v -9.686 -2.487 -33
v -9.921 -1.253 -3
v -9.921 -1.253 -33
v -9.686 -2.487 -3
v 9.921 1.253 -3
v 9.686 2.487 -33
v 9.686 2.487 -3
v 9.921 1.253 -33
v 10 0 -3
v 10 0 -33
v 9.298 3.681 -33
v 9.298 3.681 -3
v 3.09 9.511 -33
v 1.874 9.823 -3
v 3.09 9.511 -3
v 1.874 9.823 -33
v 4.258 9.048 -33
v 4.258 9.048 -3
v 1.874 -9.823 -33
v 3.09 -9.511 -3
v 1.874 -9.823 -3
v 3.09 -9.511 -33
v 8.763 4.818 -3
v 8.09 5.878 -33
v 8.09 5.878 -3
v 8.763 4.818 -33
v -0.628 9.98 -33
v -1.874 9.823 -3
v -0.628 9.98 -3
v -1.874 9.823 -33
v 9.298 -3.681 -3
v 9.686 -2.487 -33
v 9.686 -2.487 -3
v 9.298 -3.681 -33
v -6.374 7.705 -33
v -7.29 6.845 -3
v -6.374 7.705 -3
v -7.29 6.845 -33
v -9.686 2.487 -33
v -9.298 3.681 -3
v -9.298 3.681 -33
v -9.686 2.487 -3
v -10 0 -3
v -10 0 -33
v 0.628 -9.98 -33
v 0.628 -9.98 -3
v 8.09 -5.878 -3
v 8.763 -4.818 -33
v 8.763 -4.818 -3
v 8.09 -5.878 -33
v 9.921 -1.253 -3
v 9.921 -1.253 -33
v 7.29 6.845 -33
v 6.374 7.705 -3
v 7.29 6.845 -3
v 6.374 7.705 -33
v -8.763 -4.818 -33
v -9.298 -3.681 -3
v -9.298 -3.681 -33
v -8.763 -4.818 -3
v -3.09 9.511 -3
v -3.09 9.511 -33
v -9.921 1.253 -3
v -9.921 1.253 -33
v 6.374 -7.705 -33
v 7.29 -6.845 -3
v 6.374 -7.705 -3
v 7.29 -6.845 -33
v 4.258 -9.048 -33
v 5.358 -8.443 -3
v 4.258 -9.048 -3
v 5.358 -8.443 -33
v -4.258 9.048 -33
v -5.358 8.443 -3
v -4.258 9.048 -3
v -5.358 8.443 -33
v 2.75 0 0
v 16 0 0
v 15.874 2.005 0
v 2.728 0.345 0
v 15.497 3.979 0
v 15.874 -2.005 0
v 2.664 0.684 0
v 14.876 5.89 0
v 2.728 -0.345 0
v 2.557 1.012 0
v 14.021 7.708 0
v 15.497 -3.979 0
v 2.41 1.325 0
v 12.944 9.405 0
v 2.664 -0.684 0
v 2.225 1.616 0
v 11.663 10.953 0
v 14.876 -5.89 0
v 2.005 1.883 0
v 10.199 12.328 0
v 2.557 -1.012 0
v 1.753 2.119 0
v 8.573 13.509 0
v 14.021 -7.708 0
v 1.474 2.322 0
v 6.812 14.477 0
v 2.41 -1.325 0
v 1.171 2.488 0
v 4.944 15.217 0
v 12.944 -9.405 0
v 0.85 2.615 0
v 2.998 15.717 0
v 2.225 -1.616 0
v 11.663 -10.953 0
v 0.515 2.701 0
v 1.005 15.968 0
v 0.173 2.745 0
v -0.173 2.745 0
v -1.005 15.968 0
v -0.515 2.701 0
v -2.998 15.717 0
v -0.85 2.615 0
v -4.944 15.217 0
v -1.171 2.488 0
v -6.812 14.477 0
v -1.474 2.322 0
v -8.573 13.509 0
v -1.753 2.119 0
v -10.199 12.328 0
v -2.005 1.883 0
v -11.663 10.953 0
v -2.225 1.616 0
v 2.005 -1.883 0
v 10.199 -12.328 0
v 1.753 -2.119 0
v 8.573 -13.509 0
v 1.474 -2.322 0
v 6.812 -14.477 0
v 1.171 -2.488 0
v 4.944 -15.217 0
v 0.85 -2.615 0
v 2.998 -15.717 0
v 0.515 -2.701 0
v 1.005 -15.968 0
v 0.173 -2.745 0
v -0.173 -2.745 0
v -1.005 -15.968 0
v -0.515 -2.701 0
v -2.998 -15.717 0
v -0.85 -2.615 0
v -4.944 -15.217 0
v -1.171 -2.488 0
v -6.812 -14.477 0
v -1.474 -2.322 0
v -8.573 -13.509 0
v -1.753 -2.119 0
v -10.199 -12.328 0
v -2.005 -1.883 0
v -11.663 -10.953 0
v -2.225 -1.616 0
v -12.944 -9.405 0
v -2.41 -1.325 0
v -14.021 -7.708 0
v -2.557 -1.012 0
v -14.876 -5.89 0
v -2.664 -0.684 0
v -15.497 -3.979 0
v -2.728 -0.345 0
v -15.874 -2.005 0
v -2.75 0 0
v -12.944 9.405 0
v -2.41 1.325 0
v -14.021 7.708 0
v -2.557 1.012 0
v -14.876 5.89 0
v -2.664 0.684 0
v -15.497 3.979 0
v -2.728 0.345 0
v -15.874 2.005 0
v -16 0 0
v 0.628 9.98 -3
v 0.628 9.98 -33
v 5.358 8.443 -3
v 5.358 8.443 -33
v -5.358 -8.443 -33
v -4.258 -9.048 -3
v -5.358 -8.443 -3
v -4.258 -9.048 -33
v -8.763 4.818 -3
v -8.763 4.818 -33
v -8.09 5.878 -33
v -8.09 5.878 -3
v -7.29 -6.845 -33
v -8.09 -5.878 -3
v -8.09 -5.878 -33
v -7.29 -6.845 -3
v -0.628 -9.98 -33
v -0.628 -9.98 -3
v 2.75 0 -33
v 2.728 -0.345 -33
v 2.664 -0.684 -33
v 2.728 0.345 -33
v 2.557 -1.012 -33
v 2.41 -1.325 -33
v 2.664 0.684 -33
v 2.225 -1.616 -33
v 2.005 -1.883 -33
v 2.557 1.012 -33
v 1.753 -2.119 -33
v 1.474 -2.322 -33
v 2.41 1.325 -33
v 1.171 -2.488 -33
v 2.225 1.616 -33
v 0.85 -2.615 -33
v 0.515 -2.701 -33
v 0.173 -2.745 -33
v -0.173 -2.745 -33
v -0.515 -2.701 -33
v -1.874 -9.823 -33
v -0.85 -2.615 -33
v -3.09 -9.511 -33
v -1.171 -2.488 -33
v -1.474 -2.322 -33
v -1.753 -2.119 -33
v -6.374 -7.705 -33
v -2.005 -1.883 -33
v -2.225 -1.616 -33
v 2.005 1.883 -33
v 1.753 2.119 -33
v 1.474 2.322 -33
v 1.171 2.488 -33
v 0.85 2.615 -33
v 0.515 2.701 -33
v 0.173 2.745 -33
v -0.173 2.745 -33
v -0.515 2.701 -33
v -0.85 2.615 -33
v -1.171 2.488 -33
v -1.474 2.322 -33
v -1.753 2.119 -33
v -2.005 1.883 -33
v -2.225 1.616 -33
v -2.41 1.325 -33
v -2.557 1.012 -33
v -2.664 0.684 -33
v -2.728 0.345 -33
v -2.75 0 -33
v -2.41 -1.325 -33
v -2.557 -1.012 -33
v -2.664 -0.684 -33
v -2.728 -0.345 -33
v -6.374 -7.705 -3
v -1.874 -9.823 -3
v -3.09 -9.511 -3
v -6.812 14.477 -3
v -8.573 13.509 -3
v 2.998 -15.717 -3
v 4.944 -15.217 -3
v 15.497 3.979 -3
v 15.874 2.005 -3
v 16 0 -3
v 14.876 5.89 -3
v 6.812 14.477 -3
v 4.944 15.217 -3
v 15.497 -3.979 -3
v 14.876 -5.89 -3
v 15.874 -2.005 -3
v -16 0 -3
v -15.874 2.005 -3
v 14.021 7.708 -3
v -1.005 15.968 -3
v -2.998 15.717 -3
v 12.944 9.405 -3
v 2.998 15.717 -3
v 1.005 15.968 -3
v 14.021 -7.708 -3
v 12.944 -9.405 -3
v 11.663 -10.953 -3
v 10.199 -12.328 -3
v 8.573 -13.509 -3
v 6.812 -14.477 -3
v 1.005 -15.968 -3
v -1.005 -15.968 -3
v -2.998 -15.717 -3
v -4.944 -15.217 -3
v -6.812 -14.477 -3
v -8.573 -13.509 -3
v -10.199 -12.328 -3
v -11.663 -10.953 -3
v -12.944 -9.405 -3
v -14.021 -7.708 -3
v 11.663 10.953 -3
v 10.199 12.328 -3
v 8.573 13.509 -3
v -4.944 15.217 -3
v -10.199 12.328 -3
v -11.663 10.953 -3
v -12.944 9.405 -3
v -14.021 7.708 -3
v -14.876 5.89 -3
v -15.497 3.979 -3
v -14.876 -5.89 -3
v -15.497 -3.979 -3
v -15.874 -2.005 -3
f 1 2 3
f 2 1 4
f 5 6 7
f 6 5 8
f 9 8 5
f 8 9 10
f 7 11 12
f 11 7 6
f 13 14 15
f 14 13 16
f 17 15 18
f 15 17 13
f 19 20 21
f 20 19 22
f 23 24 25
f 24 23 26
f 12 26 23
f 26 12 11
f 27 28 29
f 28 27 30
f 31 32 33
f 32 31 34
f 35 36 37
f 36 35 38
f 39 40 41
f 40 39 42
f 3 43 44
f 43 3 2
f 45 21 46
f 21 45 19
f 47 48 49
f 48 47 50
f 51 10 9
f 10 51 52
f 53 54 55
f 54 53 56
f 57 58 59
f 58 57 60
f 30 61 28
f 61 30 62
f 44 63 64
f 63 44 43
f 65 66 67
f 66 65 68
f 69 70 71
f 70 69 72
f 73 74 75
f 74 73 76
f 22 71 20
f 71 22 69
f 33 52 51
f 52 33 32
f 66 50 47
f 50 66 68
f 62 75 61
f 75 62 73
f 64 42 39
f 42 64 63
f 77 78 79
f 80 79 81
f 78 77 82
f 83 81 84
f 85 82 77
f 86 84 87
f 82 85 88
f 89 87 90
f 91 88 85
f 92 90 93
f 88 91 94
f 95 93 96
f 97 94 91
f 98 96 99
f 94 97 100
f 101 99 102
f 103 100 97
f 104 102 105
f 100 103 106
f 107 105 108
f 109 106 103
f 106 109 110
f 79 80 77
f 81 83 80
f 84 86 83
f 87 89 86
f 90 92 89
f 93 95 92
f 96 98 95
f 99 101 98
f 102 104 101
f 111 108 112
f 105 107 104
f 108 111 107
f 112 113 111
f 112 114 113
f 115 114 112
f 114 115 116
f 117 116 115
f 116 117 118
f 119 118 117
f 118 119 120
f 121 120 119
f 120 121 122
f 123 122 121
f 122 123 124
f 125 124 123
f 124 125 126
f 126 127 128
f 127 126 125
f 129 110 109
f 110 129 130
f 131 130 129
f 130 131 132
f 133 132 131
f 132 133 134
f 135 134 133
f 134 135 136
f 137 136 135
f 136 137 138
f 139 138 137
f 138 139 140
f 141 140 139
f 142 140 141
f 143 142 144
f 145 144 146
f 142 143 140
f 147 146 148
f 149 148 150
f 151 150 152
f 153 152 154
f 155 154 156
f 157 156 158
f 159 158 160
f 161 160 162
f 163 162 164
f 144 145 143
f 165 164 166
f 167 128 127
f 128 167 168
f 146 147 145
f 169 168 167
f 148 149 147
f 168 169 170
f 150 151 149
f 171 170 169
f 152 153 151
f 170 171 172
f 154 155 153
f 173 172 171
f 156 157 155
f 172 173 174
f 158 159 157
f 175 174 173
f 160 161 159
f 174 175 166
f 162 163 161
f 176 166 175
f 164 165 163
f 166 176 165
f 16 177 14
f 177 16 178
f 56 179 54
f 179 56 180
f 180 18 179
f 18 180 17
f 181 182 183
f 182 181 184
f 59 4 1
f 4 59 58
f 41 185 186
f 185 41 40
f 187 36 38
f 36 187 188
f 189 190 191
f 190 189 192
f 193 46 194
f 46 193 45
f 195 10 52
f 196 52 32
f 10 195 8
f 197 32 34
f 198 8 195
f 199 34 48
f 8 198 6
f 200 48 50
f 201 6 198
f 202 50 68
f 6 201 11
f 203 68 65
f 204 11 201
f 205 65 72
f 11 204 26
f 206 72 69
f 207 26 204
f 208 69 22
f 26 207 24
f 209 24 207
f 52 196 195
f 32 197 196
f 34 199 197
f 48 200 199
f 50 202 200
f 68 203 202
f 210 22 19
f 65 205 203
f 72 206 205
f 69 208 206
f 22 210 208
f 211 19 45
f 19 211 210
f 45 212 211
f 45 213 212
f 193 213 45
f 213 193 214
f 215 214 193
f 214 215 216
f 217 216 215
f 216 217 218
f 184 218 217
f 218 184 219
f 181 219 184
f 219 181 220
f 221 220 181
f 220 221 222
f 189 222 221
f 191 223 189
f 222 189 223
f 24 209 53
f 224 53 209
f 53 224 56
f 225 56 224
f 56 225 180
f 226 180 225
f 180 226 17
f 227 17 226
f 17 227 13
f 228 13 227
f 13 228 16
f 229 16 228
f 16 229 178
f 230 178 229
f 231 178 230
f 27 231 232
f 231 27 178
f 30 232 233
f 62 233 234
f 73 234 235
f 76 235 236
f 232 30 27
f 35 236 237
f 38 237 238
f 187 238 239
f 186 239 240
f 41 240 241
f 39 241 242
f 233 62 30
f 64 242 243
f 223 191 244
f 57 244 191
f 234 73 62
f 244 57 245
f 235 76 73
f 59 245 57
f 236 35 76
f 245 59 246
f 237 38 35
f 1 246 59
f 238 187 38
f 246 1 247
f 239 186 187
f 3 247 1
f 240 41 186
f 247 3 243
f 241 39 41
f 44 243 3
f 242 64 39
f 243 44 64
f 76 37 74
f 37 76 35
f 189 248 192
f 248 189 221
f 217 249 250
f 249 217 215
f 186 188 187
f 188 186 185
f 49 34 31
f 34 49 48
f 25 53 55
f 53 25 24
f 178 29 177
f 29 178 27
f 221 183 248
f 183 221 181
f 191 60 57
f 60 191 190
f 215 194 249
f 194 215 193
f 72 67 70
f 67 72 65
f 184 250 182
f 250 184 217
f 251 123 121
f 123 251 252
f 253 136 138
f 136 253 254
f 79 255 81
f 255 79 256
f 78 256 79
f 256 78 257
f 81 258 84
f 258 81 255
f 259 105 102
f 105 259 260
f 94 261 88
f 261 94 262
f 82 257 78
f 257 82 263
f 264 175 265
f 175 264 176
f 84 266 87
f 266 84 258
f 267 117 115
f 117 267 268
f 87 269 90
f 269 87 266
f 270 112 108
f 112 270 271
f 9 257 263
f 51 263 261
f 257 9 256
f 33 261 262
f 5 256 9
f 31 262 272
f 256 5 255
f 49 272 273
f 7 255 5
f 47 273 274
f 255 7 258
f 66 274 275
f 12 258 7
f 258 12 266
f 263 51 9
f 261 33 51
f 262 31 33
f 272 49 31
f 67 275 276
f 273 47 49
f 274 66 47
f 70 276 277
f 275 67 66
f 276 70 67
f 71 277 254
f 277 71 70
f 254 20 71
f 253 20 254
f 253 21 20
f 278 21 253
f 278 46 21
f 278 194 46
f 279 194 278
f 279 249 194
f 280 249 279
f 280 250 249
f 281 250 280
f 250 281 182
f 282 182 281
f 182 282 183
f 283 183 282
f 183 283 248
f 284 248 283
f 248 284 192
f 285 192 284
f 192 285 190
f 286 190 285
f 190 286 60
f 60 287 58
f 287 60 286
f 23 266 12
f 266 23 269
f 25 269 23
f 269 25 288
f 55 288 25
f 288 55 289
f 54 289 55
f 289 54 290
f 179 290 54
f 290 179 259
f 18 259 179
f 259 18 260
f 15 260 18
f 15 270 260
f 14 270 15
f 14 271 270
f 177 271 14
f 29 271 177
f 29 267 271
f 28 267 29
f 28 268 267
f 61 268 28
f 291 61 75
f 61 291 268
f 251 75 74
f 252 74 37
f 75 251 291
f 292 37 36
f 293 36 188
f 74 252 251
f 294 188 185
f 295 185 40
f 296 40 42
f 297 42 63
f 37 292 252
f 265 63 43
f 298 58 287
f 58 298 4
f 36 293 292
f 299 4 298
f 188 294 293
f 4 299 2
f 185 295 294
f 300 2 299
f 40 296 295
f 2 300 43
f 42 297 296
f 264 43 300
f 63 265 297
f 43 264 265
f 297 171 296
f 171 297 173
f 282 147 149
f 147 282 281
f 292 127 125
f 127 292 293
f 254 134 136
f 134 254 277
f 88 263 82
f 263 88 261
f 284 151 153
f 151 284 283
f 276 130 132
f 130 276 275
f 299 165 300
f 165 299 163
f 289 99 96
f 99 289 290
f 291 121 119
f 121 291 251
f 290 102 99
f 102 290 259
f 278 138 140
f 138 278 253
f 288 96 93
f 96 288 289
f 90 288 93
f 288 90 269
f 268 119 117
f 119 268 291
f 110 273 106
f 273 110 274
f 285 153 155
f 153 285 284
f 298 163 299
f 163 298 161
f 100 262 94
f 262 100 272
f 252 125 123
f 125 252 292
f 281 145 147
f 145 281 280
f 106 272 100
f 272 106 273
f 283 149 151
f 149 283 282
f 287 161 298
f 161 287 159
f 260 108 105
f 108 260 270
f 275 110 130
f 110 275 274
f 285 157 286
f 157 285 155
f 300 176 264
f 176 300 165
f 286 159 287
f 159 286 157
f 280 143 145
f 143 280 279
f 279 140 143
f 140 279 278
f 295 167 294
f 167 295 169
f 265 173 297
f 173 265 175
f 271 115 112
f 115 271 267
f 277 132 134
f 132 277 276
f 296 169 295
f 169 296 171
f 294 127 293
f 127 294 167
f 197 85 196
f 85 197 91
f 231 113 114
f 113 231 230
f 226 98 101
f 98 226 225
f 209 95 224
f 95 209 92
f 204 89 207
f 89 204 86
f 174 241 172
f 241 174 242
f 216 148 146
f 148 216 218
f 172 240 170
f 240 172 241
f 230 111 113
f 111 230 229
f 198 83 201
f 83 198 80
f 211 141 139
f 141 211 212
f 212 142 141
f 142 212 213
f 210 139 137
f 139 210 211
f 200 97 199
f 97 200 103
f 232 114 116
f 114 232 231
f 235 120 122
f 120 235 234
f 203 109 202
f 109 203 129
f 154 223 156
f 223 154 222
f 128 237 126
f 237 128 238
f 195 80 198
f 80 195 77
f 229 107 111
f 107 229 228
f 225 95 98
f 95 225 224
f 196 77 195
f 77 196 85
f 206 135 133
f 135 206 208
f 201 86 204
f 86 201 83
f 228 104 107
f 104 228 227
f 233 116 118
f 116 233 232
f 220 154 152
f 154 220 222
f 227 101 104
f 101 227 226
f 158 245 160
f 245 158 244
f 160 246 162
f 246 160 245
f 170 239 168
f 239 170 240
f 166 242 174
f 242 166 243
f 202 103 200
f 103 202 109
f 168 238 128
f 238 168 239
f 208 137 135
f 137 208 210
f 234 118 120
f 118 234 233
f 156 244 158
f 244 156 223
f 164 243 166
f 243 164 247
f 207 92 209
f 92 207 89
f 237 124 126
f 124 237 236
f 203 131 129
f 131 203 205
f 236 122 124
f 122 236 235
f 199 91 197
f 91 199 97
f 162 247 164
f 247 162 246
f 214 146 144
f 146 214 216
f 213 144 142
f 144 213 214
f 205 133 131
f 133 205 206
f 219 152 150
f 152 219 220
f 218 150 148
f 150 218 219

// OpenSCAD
$fn = 50;


difference() {
	union() {
		translate(v = [0, 0, -33.0000000000]) {
			cylinder(h = 33, r = 10.0000000000);
		}
		translate(v = [0, 0, -3.0000000000]) {
			cylinder(h = 3, r = 16.0000000000);
		}
	}
	union() {
		#translate(v = [0, 0, -33]) {
			cylinder(h = 33, r = 2.7500000000);
		}
	}
}
